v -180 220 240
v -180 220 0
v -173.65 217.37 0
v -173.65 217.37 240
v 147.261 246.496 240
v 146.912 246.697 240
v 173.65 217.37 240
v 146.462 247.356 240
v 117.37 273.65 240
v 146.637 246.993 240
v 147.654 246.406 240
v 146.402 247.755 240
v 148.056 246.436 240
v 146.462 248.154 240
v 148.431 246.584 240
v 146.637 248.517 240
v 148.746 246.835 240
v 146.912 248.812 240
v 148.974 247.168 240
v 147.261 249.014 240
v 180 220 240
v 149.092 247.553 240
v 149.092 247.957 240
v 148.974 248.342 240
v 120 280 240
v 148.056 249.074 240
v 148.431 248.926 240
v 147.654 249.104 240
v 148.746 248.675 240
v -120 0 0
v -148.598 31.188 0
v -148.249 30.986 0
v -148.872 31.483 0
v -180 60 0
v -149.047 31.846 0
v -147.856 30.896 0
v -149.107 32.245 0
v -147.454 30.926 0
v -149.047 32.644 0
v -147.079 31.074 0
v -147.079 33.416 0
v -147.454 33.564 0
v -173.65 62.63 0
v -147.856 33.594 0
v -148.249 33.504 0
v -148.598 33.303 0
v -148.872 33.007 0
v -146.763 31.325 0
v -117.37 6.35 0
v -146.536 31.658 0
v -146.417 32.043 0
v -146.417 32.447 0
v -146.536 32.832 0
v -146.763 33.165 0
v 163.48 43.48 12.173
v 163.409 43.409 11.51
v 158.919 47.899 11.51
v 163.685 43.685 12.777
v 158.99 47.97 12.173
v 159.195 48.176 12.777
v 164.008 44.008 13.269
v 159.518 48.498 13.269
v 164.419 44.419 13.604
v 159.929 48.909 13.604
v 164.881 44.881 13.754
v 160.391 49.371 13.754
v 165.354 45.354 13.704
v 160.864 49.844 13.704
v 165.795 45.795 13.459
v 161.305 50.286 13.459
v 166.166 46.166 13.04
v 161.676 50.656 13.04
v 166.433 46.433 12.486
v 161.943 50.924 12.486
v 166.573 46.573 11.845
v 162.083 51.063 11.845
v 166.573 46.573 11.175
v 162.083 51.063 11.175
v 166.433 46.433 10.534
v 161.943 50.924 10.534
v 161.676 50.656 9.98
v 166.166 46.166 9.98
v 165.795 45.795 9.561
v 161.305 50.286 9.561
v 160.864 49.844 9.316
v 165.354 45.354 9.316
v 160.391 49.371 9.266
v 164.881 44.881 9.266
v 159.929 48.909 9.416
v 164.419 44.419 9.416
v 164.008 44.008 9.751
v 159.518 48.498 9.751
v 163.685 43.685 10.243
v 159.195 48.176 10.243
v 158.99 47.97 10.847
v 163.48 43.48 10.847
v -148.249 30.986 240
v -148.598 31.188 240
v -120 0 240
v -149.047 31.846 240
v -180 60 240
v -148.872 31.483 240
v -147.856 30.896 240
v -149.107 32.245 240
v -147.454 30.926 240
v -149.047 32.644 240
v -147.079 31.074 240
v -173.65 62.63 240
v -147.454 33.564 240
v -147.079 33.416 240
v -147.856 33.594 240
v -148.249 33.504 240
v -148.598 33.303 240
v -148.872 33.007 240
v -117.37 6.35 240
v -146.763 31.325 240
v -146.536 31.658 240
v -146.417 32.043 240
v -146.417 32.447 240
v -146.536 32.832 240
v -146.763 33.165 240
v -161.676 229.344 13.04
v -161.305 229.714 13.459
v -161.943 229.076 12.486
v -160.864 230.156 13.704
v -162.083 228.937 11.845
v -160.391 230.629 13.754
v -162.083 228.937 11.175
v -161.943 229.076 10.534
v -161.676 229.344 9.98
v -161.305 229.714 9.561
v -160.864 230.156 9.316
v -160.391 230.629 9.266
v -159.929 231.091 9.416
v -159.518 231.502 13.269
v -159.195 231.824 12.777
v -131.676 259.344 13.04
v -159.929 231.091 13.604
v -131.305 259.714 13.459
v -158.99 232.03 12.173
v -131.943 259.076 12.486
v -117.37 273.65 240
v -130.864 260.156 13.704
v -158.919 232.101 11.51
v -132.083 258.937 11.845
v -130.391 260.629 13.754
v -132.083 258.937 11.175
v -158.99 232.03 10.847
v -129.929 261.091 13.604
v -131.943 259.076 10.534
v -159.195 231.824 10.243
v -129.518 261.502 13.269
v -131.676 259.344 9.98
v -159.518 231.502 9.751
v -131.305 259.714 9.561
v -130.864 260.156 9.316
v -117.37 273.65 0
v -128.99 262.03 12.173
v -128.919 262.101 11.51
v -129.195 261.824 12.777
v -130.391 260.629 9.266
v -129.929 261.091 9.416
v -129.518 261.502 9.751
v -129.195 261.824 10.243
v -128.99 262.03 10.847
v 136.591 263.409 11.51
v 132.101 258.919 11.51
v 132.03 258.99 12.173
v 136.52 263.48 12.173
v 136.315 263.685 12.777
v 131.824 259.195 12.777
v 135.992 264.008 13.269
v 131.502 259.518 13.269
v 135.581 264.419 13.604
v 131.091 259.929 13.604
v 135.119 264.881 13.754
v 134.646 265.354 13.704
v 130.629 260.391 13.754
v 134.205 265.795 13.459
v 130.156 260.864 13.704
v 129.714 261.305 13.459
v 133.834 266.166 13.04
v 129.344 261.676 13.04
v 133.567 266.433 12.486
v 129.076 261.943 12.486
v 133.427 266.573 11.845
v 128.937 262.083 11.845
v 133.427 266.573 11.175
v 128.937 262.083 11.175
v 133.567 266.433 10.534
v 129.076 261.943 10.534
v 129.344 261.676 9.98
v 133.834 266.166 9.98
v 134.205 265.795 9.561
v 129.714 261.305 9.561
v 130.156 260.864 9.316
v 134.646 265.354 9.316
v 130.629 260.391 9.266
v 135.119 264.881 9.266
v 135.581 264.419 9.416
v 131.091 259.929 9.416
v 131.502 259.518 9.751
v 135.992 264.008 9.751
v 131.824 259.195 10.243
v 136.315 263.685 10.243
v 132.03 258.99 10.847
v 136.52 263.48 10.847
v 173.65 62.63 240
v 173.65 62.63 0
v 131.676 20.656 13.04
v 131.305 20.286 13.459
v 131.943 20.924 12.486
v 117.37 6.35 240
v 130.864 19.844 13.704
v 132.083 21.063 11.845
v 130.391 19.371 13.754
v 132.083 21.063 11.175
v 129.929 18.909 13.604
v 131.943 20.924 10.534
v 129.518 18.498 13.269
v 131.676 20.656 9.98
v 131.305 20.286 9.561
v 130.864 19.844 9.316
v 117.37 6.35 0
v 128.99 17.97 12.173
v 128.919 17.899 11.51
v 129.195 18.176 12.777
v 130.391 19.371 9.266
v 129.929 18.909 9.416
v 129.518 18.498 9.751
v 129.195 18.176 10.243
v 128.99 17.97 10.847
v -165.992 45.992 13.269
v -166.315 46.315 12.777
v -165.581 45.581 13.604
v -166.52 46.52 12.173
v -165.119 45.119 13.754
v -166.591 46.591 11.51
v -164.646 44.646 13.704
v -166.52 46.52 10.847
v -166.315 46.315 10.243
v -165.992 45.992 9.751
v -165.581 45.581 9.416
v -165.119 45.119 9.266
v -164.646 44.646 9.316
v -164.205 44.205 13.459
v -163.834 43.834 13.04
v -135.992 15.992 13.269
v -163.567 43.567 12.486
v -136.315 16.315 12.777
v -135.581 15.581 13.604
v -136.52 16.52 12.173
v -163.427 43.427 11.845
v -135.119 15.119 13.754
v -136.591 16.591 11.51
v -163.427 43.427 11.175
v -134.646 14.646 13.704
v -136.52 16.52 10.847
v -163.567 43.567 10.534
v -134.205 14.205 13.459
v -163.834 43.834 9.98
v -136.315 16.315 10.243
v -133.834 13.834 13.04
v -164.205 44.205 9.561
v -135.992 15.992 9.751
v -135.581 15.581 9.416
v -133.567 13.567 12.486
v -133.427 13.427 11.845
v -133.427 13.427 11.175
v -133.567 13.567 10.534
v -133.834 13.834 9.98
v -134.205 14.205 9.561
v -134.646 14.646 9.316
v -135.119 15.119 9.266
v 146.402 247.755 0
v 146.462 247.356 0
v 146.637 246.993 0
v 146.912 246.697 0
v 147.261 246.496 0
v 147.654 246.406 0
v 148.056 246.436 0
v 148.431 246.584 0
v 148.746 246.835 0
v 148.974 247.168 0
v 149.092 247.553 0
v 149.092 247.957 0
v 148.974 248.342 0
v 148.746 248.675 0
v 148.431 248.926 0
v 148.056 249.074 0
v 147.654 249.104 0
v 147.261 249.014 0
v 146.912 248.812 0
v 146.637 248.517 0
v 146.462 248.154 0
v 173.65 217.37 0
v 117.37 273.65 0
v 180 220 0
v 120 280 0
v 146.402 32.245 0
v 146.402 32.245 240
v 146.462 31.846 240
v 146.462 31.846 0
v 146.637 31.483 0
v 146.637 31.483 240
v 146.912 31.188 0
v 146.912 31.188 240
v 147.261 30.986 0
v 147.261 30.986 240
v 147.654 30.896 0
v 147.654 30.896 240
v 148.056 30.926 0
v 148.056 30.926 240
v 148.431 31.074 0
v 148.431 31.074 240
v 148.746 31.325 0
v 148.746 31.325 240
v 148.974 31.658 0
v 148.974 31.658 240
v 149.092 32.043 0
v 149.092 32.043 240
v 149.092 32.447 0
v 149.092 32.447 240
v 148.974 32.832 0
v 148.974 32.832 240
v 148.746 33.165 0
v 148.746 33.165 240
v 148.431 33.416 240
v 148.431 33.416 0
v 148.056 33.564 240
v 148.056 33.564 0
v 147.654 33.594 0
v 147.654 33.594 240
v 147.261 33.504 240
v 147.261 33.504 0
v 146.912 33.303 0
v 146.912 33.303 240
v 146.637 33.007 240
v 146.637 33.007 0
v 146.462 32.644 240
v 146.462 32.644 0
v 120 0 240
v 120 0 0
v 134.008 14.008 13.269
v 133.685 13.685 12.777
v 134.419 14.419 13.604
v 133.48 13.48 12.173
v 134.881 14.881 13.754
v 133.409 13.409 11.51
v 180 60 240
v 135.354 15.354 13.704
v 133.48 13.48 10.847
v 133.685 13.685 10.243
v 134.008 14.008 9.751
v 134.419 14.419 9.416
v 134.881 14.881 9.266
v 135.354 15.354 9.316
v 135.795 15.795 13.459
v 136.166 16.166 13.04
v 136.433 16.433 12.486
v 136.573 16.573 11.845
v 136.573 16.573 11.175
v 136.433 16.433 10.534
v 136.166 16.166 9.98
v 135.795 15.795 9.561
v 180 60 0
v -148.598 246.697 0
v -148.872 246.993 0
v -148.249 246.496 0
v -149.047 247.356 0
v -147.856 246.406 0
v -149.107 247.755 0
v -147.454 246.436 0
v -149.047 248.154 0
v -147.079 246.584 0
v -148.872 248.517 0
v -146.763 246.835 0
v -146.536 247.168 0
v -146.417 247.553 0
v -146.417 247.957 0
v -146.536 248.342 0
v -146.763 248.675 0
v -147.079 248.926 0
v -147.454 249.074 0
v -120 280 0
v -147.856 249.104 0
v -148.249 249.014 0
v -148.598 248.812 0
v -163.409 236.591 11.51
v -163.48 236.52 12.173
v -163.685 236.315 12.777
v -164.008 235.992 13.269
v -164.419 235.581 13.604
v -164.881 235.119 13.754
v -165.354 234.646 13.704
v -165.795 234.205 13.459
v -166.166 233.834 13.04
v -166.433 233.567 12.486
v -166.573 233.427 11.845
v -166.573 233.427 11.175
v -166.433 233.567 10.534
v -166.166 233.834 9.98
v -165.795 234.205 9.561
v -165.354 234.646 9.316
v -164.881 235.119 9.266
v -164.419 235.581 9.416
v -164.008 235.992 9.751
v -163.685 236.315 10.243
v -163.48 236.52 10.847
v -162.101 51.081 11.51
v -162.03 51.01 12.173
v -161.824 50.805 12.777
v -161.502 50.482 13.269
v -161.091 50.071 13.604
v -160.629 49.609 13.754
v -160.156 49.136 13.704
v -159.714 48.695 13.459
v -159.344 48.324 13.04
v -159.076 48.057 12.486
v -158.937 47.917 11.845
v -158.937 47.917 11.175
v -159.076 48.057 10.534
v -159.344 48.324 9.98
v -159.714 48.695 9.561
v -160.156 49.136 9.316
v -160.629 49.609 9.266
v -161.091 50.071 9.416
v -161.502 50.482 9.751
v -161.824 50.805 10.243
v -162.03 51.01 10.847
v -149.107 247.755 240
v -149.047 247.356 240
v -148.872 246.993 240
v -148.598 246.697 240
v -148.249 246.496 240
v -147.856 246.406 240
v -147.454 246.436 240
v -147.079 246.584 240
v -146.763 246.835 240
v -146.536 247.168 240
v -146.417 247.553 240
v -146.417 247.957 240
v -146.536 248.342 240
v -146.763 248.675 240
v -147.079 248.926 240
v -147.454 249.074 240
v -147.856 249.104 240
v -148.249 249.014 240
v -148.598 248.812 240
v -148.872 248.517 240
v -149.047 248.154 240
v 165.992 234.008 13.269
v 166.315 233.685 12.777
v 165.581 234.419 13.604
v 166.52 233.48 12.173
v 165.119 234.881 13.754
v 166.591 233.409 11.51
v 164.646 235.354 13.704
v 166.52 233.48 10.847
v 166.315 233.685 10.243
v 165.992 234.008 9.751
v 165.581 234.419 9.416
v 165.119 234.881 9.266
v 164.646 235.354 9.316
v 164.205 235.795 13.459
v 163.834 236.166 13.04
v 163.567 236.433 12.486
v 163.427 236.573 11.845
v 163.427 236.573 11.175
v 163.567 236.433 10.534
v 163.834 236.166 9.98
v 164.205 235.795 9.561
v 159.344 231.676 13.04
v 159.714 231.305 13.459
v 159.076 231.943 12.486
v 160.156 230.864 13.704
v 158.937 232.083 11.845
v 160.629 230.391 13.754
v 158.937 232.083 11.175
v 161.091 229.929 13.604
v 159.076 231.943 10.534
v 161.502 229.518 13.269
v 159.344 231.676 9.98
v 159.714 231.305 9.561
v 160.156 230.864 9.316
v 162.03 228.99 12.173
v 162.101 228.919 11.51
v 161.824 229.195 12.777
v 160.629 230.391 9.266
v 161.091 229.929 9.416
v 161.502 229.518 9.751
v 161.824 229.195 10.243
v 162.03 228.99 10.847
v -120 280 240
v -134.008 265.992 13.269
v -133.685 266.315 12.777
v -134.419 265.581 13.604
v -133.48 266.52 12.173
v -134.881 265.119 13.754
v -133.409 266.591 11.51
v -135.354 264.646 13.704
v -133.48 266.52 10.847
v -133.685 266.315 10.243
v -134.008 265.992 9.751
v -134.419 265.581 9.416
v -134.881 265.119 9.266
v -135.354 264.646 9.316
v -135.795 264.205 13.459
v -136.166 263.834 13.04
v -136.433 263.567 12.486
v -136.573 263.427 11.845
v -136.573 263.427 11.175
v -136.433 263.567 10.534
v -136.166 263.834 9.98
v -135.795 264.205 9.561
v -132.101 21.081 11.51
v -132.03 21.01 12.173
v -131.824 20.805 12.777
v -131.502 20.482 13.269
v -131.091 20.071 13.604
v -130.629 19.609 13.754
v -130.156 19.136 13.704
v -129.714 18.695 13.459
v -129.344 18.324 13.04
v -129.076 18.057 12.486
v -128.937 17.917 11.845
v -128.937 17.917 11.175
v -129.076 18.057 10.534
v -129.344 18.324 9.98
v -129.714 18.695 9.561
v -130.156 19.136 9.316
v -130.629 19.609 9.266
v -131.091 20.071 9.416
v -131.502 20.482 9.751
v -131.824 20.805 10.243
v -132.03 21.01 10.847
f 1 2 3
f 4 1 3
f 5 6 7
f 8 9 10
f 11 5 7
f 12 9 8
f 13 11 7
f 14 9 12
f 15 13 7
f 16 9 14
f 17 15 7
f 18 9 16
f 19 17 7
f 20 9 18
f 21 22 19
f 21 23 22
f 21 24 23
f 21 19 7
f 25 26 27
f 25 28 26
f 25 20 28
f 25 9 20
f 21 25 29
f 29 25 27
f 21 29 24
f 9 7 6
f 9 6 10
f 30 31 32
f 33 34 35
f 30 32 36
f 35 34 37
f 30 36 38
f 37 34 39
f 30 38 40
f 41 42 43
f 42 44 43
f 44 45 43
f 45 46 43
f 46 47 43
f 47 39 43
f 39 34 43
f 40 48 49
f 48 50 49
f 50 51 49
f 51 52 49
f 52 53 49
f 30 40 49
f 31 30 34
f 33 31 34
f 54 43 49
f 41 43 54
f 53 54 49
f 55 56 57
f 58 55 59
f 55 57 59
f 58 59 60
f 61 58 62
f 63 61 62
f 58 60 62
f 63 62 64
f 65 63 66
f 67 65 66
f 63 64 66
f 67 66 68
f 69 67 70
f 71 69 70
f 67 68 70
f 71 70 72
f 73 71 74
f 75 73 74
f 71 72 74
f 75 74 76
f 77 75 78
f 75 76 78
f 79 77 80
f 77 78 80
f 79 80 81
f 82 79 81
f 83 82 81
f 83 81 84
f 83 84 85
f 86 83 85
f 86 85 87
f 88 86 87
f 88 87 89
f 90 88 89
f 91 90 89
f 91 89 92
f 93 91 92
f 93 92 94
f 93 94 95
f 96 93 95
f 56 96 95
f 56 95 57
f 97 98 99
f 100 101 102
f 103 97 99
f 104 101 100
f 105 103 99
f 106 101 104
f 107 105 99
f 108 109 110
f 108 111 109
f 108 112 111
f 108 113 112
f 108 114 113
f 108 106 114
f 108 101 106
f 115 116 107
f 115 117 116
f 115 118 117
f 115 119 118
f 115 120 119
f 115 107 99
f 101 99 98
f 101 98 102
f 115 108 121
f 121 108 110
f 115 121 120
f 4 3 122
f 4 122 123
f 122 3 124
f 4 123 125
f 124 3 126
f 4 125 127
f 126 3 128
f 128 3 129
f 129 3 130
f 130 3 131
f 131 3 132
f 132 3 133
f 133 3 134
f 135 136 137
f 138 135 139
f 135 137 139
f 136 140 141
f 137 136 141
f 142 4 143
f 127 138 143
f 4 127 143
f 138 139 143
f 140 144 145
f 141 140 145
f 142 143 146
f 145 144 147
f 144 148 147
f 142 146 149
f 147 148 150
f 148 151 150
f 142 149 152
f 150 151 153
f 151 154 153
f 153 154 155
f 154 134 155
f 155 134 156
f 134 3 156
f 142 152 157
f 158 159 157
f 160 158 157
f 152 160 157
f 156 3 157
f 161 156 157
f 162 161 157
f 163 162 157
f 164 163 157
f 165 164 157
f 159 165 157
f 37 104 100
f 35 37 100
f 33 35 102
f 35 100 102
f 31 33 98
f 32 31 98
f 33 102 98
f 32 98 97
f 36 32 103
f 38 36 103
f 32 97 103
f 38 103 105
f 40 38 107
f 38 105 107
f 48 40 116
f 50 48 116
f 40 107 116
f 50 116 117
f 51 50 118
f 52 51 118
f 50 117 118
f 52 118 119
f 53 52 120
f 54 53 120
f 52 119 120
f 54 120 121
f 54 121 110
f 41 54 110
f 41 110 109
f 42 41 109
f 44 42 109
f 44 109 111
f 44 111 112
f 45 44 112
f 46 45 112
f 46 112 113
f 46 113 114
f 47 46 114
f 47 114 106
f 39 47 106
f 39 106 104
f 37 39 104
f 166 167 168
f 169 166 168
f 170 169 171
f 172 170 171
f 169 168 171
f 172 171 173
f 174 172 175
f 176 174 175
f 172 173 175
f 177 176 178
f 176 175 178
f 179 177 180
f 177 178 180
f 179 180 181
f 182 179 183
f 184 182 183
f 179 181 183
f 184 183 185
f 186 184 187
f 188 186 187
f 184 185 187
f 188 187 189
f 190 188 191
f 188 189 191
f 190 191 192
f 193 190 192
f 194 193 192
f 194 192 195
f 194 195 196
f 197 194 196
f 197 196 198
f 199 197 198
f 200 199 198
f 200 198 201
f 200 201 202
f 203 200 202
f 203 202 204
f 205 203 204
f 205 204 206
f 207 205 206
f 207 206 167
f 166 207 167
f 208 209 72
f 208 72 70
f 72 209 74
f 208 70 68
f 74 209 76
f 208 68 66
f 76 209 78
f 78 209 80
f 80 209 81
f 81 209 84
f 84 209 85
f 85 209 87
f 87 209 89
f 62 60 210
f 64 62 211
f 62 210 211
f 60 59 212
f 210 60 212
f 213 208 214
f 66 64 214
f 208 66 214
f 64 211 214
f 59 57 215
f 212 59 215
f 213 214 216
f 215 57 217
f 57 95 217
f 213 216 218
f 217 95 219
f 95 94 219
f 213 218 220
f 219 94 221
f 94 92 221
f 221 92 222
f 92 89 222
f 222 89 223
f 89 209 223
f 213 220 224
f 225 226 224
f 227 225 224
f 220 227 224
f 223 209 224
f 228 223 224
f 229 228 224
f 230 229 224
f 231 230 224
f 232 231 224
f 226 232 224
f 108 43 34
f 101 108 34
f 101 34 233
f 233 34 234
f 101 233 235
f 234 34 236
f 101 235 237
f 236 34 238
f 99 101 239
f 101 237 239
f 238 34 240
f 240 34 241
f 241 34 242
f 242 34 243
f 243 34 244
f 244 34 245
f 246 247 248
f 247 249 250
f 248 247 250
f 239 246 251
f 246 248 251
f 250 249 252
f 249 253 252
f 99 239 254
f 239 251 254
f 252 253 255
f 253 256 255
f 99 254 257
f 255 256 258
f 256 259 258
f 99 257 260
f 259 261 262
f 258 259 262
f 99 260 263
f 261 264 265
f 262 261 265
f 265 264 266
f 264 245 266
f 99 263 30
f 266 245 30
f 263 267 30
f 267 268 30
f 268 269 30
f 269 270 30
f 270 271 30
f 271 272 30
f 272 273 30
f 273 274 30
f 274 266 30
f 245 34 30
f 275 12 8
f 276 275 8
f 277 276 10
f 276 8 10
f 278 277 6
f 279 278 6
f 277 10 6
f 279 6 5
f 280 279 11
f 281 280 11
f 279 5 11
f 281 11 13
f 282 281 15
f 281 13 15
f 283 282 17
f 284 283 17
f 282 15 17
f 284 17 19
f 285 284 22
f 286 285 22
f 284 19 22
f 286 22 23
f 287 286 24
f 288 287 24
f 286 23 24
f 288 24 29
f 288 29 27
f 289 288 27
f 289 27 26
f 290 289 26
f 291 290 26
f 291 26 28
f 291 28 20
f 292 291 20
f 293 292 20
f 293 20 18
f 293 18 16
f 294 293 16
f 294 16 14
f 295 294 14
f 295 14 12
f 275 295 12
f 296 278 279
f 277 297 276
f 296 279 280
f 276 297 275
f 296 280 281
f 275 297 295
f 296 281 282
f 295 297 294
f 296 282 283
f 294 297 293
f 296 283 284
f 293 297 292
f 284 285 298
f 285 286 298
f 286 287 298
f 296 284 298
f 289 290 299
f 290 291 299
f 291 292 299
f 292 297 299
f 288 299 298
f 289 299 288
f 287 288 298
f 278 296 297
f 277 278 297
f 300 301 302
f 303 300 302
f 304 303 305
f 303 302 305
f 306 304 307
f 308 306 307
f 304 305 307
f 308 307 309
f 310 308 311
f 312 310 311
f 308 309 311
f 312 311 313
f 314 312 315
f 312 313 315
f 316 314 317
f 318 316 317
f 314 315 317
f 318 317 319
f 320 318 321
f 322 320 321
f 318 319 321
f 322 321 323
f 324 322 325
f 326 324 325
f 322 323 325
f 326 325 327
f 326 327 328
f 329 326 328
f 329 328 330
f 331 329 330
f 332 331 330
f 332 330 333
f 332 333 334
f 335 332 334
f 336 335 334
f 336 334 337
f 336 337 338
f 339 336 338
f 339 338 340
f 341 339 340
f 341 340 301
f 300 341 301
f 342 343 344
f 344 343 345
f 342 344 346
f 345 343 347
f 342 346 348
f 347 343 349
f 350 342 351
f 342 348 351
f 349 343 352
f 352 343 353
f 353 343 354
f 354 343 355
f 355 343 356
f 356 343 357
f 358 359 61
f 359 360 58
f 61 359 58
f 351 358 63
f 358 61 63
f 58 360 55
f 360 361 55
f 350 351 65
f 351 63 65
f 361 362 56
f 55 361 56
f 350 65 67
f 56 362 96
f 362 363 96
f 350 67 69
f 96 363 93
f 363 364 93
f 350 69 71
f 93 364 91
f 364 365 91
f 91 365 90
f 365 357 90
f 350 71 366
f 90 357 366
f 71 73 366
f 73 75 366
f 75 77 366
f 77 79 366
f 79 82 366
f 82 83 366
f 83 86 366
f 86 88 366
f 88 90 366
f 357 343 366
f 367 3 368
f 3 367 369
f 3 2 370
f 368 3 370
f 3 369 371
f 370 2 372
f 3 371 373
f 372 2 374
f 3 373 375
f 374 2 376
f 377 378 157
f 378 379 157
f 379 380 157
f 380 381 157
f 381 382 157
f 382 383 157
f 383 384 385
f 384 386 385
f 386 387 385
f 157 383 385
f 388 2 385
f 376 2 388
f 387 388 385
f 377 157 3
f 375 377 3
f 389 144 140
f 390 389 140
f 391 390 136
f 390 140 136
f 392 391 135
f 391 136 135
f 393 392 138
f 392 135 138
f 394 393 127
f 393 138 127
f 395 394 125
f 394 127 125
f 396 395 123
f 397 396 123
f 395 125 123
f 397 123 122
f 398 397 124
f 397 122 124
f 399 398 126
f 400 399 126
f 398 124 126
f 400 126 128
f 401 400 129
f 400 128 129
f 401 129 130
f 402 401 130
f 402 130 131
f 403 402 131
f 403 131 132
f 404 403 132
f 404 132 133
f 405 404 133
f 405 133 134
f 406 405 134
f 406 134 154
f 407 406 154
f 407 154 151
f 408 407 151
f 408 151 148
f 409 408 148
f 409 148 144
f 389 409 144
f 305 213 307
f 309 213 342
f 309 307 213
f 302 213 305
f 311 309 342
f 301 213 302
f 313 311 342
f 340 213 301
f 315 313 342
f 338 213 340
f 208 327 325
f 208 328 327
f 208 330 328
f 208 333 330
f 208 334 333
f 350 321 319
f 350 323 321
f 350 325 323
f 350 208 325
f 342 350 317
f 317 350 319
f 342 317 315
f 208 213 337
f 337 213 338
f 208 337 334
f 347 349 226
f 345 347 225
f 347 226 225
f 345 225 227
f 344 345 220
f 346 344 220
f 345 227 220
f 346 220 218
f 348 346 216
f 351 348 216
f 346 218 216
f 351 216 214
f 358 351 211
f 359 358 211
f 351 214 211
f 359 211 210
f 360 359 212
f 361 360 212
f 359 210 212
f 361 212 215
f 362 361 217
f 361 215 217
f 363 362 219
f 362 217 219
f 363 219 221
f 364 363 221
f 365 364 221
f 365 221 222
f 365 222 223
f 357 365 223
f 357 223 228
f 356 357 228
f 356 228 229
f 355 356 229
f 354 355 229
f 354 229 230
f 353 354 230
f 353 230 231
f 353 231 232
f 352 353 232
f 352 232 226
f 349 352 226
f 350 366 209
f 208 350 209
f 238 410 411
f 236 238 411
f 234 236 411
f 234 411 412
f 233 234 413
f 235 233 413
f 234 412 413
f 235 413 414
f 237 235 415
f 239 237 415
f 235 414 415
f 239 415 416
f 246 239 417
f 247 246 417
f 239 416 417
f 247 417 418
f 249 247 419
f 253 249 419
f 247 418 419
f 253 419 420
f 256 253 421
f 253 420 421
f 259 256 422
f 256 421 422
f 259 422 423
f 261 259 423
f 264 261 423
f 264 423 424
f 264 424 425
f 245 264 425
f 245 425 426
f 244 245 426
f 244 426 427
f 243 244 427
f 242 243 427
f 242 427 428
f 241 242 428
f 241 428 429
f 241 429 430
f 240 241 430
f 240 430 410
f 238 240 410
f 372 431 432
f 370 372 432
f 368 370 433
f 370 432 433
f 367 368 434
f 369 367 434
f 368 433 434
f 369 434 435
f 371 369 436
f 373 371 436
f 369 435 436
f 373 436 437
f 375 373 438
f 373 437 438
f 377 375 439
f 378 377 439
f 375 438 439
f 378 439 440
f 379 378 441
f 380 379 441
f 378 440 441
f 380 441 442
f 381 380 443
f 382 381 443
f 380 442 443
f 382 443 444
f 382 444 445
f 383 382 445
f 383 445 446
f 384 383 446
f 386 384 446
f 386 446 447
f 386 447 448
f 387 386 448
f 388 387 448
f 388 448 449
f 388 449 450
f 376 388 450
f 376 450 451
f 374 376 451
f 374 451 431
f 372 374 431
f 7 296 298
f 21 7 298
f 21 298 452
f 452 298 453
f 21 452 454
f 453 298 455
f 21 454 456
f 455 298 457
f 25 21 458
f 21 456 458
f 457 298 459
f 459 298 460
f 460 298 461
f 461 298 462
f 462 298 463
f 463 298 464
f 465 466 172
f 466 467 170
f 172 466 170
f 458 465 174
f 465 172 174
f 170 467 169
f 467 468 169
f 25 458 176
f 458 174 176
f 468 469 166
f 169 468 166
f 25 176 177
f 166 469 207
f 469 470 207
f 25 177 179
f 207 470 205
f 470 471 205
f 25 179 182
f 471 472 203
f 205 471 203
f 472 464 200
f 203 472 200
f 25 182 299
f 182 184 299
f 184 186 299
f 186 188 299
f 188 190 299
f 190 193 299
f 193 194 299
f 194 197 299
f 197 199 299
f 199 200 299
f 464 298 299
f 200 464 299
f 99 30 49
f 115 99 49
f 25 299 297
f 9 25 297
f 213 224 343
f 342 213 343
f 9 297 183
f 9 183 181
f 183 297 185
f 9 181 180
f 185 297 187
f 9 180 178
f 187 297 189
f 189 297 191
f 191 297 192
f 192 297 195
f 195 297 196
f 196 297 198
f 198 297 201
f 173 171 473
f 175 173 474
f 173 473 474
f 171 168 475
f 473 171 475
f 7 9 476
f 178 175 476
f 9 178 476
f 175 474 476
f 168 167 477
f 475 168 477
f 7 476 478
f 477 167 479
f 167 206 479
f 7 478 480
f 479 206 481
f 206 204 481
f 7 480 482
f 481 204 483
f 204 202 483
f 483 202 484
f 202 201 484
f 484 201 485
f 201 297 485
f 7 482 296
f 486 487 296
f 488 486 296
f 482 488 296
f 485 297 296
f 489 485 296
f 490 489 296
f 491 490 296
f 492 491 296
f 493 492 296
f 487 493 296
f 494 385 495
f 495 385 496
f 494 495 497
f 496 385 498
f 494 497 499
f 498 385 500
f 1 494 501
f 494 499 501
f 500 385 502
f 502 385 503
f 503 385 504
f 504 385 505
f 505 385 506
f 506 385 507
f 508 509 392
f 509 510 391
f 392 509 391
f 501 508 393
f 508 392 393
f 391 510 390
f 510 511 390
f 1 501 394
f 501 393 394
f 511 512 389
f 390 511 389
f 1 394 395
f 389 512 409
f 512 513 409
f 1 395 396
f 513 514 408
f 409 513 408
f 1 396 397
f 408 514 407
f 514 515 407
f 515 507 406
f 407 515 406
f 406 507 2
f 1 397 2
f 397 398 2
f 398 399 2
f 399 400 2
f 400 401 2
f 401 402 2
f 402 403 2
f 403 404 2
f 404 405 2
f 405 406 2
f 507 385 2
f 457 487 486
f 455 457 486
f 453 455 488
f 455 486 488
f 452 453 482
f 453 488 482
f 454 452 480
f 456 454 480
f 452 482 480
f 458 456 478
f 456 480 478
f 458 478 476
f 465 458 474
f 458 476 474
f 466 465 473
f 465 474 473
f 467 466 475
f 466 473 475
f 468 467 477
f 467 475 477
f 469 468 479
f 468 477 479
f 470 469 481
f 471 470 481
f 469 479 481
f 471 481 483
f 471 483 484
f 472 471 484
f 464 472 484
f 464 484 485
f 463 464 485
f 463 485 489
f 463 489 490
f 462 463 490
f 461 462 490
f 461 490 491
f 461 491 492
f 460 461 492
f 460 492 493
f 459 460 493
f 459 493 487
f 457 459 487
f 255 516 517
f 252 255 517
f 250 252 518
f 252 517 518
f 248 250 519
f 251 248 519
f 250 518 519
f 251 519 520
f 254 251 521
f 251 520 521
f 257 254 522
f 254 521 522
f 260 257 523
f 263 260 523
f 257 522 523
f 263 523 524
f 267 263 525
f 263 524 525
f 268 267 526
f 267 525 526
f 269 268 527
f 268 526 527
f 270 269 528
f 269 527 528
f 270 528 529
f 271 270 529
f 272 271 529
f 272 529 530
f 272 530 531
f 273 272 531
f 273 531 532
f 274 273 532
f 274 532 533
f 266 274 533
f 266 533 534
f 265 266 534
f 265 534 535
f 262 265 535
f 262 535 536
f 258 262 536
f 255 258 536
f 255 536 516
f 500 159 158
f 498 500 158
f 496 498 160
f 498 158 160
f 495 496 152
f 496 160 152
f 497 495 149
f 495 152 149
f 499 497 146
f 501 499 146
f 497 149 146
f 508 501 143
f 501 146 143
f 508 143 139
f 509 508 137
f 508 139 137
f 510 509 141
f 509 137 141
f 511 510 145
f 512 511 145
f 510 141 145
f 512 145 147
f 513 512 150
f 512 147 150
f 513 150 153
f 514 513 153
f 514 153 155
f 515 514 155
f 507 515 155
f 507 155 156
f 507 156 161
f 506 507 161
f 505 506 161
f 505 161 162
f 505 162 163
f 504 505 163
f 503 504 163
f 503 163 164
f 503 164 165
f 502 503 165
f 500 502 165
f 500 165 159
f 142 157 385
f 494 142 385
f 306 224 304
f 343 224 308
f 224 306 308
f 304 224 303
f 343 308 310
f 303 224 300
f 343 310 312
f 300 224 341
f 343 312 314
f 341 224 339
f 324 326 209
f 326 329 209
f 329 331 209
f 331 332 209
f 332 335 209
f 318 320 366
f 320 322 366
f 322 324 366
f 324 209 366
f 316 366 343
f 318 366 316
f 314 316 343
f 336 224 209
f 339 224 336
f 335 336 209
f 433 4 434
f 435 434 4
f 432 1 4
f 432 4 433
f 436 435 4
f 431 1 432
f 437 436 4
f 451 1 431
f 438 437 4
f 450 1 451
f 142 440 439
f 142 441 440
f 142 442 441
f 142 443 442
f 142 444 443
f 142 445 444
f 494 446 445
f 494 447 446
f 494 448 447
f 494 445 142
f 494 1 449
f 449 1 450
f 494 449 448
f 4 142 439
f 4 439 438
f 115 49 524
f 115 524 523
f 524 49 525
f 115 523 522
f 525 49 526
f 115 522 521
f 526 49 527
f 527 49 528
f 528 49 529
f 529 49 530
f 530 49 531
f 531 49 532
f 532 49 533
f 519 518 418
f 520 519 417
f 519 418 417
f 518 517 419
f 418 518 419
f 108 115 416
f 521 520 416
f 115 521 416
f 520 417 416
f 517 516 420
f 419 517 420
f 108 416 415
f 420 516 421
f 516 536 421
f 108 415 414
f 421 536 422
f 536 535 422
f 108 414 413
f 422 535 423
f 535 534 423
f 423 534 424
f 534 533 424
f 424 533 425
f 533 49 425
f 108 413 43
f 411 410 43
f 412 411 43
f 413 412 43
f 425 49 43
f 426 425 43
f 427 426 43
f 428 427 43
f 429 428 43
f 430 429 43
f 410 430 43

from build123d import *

# Parameters (mm, degrees)
F1_DEPTH       = 240
F2_DEPTH       = 240
F3_DEPTH       = 240
F4_DEPTH       = 240
F9_D           = 4.5
F9_DEPTH       = 12
F9_TIP         = 1.3519363928
F9_ON_F5_D     = 4.5
F9_ON_F5_DEPTH = 12
F9_ON_F5_TIP   = 1.3519363928
F9_ON_F6_D     = 4.5
F9_ON_F6_DEPTH = 12
F9_ON_F6_TIP   = 1.3519363928
F9_ON_F7_D     = 4.5
F9_ON_F7_DEPTH = 12
F9_ON_F7_TIP   = 1.3519363928
F14_D          = 2.7051
F14_ON_F11_D   = 2.7051
F14_ON_F10_D   = 2.7051
F14_ON_F12_D   = 2.7051


with BuildPart() as f1:
    # F0 (on Top) → F1 (new body)
    with BuildSketch(Plane.XY):
        Polygon((-180, 60), (-120, 0), (-117.3697438789, 6.35), (-173.65, 62.6302561211), align=None)
    extrude(amount=F1_DEPTH)

    # F9 on F5
    with Locations(Plane(origin=(-60, -60, 0), x_dir=(0.7071067812, -0.7071067812, 0), z_dir=(-0.7071067812, -0.7071067812, 0))):
        with Locations((-106.066017178, 11.51), (-148.4924240492, 11.51)):
            Hole(F9_ON_F5_D / 2, depth=F9_ON_F5_DEPTH)
            with Locations((0, 0, -(F9_ON_F5_DEPTH + F9_ON_F5_TIP / 2))):  # 118° drill point
                Cone(0, F9_ON_F5_D / 2, F9_ON_F5_TIP, mode=Mode.SUBTRACT)

    # F14 on F10 (through all)
    with Locations(Plane(origin=(0, 0, 0), x_dir=(1, 0, 0), z_dir=(0, 0, -1))):
        with Locations((-147.7549359697, -32.2450640303)):
            Hole(F14_ON_F10_D / 2)


with BuildPart() as f2:
    # F0 (on Top) → F2 (new body)
    with BuildSketch(Plane.XY):
        Polygon((-120, 280), (-180, 220), (-173.65, 217.3697438789), (-117.3697438789, 273.65), align=None)
    extrude(amount=F2_DEPTH)

    # F9
    with Locations(Plane(origin=(-200, 200, 0), x_dir=(-0.7071067812, -0.7071067812, 0), z_dir=(-0.7071067812, 0.7071067812, 0))):
        with Locations((-91.9238815543, 11.51), (-49.4974746831, 11.51)):
            Hole(F9_D / 2, depth=F9_DEPTH)
            with Locations((0, 0, -(F9_DEPTH + F9_TIP / 2))):  # 118° drill point
                Cone(0, F9_D / 2, F9_TIP, mode=Mode.SUBTRACT)

    # F14 on F12 (through all)
    with Locations(Plane(origin=(0, 0, 0), x_dir=(1, 0, 0), z_dir=(0, 0, -1))):
        with Locations((-147.7549359697, -247.7549359697)):
            Hole(F14_ON_F12_D / 2)


with BuildPart() as f3:
    # F0 (on Top) → F3 (new body)
    with BuildSketch(Plane.XY):
        Polygon((173.65, 217.3697438789), (180, 220), (120, 280), (117.3697438789, 273.65), align=None)
    extrude(amount=F3_DEPTH)

    # F9 on F7
    with Locations(Plane(origin=(200, 200, 0), x_dir=(-0.7071067812, 0.7071067812, 0), z_dir=(0.7071067812, 0.7071067812, 0))):
        with Locations((49.4974746831, 11.51), (91.9238815543, 11.51)):
            Hole(F9_ON_F7_D / 2, depth=F9_ON_F7_DEPTH)
            with Locations((0, 0, -(F9_ON_F7_DEPTH + F9_ON_F7_TIP / 2))):  # 118° drill point
                Cone(0, F9_ON_F7_D / 2, F9_ON_F7_TIP, mode=Mode.SUBTRACT)

    # F14 (through all)
    with Locations(Plane(origin=(0, 0, 0), x_dir=(1, 0, 0), z_dir=(0, 0, -1))):
        with Locations((147.7549359697, -247.7549359697)):
            Hole(F14_D / 2)


with BuildPart() as f4:
    # F0 (on Top) → F4 (new body)
    with BuildSketch(Plane.XY):
        Polygon((117.3697438789, 6.35), (120, 0), (180, 60), (173.65, 62.6302561211), align=None)
    extrude(amount=F4_DEPTH)

    # F9 on F6
    with Locations(Plane(origin=(60, -60, 0), x_dir=(0.7071067812, 0.7071067812, 0), z_dir=(0.7071067812, -0.7071067812, 0))):
        with Locations((148.4924240492, 11.51), (106.066017178, 11.51)):
            Hole(F9_ON_F6_D / 2, depth=F9_ON_F6_DEPTH)
            with Locations((0, 0, -(F9_ON_F6_DEPTH + F9_ON_F6_TIP / 2))):  # 118° drill point
                Cone(0, F9_ON_F6_D / 2, F9_ON_F6_TIP, mode=Mode.SUBTRACT)

    # F14 on F11 (through all)
    with Locations(Plane(origin=(0, 0, 0), x_dir=(1, 0, 0), z_dir=(0, 0, -1))):
        with Locations((147.7549359697, -32.2450640303)):
            Hole(F14_ON_F11_D / 2)


solid = Compound([f1.part, f2.part, f3.part, f4.part])
